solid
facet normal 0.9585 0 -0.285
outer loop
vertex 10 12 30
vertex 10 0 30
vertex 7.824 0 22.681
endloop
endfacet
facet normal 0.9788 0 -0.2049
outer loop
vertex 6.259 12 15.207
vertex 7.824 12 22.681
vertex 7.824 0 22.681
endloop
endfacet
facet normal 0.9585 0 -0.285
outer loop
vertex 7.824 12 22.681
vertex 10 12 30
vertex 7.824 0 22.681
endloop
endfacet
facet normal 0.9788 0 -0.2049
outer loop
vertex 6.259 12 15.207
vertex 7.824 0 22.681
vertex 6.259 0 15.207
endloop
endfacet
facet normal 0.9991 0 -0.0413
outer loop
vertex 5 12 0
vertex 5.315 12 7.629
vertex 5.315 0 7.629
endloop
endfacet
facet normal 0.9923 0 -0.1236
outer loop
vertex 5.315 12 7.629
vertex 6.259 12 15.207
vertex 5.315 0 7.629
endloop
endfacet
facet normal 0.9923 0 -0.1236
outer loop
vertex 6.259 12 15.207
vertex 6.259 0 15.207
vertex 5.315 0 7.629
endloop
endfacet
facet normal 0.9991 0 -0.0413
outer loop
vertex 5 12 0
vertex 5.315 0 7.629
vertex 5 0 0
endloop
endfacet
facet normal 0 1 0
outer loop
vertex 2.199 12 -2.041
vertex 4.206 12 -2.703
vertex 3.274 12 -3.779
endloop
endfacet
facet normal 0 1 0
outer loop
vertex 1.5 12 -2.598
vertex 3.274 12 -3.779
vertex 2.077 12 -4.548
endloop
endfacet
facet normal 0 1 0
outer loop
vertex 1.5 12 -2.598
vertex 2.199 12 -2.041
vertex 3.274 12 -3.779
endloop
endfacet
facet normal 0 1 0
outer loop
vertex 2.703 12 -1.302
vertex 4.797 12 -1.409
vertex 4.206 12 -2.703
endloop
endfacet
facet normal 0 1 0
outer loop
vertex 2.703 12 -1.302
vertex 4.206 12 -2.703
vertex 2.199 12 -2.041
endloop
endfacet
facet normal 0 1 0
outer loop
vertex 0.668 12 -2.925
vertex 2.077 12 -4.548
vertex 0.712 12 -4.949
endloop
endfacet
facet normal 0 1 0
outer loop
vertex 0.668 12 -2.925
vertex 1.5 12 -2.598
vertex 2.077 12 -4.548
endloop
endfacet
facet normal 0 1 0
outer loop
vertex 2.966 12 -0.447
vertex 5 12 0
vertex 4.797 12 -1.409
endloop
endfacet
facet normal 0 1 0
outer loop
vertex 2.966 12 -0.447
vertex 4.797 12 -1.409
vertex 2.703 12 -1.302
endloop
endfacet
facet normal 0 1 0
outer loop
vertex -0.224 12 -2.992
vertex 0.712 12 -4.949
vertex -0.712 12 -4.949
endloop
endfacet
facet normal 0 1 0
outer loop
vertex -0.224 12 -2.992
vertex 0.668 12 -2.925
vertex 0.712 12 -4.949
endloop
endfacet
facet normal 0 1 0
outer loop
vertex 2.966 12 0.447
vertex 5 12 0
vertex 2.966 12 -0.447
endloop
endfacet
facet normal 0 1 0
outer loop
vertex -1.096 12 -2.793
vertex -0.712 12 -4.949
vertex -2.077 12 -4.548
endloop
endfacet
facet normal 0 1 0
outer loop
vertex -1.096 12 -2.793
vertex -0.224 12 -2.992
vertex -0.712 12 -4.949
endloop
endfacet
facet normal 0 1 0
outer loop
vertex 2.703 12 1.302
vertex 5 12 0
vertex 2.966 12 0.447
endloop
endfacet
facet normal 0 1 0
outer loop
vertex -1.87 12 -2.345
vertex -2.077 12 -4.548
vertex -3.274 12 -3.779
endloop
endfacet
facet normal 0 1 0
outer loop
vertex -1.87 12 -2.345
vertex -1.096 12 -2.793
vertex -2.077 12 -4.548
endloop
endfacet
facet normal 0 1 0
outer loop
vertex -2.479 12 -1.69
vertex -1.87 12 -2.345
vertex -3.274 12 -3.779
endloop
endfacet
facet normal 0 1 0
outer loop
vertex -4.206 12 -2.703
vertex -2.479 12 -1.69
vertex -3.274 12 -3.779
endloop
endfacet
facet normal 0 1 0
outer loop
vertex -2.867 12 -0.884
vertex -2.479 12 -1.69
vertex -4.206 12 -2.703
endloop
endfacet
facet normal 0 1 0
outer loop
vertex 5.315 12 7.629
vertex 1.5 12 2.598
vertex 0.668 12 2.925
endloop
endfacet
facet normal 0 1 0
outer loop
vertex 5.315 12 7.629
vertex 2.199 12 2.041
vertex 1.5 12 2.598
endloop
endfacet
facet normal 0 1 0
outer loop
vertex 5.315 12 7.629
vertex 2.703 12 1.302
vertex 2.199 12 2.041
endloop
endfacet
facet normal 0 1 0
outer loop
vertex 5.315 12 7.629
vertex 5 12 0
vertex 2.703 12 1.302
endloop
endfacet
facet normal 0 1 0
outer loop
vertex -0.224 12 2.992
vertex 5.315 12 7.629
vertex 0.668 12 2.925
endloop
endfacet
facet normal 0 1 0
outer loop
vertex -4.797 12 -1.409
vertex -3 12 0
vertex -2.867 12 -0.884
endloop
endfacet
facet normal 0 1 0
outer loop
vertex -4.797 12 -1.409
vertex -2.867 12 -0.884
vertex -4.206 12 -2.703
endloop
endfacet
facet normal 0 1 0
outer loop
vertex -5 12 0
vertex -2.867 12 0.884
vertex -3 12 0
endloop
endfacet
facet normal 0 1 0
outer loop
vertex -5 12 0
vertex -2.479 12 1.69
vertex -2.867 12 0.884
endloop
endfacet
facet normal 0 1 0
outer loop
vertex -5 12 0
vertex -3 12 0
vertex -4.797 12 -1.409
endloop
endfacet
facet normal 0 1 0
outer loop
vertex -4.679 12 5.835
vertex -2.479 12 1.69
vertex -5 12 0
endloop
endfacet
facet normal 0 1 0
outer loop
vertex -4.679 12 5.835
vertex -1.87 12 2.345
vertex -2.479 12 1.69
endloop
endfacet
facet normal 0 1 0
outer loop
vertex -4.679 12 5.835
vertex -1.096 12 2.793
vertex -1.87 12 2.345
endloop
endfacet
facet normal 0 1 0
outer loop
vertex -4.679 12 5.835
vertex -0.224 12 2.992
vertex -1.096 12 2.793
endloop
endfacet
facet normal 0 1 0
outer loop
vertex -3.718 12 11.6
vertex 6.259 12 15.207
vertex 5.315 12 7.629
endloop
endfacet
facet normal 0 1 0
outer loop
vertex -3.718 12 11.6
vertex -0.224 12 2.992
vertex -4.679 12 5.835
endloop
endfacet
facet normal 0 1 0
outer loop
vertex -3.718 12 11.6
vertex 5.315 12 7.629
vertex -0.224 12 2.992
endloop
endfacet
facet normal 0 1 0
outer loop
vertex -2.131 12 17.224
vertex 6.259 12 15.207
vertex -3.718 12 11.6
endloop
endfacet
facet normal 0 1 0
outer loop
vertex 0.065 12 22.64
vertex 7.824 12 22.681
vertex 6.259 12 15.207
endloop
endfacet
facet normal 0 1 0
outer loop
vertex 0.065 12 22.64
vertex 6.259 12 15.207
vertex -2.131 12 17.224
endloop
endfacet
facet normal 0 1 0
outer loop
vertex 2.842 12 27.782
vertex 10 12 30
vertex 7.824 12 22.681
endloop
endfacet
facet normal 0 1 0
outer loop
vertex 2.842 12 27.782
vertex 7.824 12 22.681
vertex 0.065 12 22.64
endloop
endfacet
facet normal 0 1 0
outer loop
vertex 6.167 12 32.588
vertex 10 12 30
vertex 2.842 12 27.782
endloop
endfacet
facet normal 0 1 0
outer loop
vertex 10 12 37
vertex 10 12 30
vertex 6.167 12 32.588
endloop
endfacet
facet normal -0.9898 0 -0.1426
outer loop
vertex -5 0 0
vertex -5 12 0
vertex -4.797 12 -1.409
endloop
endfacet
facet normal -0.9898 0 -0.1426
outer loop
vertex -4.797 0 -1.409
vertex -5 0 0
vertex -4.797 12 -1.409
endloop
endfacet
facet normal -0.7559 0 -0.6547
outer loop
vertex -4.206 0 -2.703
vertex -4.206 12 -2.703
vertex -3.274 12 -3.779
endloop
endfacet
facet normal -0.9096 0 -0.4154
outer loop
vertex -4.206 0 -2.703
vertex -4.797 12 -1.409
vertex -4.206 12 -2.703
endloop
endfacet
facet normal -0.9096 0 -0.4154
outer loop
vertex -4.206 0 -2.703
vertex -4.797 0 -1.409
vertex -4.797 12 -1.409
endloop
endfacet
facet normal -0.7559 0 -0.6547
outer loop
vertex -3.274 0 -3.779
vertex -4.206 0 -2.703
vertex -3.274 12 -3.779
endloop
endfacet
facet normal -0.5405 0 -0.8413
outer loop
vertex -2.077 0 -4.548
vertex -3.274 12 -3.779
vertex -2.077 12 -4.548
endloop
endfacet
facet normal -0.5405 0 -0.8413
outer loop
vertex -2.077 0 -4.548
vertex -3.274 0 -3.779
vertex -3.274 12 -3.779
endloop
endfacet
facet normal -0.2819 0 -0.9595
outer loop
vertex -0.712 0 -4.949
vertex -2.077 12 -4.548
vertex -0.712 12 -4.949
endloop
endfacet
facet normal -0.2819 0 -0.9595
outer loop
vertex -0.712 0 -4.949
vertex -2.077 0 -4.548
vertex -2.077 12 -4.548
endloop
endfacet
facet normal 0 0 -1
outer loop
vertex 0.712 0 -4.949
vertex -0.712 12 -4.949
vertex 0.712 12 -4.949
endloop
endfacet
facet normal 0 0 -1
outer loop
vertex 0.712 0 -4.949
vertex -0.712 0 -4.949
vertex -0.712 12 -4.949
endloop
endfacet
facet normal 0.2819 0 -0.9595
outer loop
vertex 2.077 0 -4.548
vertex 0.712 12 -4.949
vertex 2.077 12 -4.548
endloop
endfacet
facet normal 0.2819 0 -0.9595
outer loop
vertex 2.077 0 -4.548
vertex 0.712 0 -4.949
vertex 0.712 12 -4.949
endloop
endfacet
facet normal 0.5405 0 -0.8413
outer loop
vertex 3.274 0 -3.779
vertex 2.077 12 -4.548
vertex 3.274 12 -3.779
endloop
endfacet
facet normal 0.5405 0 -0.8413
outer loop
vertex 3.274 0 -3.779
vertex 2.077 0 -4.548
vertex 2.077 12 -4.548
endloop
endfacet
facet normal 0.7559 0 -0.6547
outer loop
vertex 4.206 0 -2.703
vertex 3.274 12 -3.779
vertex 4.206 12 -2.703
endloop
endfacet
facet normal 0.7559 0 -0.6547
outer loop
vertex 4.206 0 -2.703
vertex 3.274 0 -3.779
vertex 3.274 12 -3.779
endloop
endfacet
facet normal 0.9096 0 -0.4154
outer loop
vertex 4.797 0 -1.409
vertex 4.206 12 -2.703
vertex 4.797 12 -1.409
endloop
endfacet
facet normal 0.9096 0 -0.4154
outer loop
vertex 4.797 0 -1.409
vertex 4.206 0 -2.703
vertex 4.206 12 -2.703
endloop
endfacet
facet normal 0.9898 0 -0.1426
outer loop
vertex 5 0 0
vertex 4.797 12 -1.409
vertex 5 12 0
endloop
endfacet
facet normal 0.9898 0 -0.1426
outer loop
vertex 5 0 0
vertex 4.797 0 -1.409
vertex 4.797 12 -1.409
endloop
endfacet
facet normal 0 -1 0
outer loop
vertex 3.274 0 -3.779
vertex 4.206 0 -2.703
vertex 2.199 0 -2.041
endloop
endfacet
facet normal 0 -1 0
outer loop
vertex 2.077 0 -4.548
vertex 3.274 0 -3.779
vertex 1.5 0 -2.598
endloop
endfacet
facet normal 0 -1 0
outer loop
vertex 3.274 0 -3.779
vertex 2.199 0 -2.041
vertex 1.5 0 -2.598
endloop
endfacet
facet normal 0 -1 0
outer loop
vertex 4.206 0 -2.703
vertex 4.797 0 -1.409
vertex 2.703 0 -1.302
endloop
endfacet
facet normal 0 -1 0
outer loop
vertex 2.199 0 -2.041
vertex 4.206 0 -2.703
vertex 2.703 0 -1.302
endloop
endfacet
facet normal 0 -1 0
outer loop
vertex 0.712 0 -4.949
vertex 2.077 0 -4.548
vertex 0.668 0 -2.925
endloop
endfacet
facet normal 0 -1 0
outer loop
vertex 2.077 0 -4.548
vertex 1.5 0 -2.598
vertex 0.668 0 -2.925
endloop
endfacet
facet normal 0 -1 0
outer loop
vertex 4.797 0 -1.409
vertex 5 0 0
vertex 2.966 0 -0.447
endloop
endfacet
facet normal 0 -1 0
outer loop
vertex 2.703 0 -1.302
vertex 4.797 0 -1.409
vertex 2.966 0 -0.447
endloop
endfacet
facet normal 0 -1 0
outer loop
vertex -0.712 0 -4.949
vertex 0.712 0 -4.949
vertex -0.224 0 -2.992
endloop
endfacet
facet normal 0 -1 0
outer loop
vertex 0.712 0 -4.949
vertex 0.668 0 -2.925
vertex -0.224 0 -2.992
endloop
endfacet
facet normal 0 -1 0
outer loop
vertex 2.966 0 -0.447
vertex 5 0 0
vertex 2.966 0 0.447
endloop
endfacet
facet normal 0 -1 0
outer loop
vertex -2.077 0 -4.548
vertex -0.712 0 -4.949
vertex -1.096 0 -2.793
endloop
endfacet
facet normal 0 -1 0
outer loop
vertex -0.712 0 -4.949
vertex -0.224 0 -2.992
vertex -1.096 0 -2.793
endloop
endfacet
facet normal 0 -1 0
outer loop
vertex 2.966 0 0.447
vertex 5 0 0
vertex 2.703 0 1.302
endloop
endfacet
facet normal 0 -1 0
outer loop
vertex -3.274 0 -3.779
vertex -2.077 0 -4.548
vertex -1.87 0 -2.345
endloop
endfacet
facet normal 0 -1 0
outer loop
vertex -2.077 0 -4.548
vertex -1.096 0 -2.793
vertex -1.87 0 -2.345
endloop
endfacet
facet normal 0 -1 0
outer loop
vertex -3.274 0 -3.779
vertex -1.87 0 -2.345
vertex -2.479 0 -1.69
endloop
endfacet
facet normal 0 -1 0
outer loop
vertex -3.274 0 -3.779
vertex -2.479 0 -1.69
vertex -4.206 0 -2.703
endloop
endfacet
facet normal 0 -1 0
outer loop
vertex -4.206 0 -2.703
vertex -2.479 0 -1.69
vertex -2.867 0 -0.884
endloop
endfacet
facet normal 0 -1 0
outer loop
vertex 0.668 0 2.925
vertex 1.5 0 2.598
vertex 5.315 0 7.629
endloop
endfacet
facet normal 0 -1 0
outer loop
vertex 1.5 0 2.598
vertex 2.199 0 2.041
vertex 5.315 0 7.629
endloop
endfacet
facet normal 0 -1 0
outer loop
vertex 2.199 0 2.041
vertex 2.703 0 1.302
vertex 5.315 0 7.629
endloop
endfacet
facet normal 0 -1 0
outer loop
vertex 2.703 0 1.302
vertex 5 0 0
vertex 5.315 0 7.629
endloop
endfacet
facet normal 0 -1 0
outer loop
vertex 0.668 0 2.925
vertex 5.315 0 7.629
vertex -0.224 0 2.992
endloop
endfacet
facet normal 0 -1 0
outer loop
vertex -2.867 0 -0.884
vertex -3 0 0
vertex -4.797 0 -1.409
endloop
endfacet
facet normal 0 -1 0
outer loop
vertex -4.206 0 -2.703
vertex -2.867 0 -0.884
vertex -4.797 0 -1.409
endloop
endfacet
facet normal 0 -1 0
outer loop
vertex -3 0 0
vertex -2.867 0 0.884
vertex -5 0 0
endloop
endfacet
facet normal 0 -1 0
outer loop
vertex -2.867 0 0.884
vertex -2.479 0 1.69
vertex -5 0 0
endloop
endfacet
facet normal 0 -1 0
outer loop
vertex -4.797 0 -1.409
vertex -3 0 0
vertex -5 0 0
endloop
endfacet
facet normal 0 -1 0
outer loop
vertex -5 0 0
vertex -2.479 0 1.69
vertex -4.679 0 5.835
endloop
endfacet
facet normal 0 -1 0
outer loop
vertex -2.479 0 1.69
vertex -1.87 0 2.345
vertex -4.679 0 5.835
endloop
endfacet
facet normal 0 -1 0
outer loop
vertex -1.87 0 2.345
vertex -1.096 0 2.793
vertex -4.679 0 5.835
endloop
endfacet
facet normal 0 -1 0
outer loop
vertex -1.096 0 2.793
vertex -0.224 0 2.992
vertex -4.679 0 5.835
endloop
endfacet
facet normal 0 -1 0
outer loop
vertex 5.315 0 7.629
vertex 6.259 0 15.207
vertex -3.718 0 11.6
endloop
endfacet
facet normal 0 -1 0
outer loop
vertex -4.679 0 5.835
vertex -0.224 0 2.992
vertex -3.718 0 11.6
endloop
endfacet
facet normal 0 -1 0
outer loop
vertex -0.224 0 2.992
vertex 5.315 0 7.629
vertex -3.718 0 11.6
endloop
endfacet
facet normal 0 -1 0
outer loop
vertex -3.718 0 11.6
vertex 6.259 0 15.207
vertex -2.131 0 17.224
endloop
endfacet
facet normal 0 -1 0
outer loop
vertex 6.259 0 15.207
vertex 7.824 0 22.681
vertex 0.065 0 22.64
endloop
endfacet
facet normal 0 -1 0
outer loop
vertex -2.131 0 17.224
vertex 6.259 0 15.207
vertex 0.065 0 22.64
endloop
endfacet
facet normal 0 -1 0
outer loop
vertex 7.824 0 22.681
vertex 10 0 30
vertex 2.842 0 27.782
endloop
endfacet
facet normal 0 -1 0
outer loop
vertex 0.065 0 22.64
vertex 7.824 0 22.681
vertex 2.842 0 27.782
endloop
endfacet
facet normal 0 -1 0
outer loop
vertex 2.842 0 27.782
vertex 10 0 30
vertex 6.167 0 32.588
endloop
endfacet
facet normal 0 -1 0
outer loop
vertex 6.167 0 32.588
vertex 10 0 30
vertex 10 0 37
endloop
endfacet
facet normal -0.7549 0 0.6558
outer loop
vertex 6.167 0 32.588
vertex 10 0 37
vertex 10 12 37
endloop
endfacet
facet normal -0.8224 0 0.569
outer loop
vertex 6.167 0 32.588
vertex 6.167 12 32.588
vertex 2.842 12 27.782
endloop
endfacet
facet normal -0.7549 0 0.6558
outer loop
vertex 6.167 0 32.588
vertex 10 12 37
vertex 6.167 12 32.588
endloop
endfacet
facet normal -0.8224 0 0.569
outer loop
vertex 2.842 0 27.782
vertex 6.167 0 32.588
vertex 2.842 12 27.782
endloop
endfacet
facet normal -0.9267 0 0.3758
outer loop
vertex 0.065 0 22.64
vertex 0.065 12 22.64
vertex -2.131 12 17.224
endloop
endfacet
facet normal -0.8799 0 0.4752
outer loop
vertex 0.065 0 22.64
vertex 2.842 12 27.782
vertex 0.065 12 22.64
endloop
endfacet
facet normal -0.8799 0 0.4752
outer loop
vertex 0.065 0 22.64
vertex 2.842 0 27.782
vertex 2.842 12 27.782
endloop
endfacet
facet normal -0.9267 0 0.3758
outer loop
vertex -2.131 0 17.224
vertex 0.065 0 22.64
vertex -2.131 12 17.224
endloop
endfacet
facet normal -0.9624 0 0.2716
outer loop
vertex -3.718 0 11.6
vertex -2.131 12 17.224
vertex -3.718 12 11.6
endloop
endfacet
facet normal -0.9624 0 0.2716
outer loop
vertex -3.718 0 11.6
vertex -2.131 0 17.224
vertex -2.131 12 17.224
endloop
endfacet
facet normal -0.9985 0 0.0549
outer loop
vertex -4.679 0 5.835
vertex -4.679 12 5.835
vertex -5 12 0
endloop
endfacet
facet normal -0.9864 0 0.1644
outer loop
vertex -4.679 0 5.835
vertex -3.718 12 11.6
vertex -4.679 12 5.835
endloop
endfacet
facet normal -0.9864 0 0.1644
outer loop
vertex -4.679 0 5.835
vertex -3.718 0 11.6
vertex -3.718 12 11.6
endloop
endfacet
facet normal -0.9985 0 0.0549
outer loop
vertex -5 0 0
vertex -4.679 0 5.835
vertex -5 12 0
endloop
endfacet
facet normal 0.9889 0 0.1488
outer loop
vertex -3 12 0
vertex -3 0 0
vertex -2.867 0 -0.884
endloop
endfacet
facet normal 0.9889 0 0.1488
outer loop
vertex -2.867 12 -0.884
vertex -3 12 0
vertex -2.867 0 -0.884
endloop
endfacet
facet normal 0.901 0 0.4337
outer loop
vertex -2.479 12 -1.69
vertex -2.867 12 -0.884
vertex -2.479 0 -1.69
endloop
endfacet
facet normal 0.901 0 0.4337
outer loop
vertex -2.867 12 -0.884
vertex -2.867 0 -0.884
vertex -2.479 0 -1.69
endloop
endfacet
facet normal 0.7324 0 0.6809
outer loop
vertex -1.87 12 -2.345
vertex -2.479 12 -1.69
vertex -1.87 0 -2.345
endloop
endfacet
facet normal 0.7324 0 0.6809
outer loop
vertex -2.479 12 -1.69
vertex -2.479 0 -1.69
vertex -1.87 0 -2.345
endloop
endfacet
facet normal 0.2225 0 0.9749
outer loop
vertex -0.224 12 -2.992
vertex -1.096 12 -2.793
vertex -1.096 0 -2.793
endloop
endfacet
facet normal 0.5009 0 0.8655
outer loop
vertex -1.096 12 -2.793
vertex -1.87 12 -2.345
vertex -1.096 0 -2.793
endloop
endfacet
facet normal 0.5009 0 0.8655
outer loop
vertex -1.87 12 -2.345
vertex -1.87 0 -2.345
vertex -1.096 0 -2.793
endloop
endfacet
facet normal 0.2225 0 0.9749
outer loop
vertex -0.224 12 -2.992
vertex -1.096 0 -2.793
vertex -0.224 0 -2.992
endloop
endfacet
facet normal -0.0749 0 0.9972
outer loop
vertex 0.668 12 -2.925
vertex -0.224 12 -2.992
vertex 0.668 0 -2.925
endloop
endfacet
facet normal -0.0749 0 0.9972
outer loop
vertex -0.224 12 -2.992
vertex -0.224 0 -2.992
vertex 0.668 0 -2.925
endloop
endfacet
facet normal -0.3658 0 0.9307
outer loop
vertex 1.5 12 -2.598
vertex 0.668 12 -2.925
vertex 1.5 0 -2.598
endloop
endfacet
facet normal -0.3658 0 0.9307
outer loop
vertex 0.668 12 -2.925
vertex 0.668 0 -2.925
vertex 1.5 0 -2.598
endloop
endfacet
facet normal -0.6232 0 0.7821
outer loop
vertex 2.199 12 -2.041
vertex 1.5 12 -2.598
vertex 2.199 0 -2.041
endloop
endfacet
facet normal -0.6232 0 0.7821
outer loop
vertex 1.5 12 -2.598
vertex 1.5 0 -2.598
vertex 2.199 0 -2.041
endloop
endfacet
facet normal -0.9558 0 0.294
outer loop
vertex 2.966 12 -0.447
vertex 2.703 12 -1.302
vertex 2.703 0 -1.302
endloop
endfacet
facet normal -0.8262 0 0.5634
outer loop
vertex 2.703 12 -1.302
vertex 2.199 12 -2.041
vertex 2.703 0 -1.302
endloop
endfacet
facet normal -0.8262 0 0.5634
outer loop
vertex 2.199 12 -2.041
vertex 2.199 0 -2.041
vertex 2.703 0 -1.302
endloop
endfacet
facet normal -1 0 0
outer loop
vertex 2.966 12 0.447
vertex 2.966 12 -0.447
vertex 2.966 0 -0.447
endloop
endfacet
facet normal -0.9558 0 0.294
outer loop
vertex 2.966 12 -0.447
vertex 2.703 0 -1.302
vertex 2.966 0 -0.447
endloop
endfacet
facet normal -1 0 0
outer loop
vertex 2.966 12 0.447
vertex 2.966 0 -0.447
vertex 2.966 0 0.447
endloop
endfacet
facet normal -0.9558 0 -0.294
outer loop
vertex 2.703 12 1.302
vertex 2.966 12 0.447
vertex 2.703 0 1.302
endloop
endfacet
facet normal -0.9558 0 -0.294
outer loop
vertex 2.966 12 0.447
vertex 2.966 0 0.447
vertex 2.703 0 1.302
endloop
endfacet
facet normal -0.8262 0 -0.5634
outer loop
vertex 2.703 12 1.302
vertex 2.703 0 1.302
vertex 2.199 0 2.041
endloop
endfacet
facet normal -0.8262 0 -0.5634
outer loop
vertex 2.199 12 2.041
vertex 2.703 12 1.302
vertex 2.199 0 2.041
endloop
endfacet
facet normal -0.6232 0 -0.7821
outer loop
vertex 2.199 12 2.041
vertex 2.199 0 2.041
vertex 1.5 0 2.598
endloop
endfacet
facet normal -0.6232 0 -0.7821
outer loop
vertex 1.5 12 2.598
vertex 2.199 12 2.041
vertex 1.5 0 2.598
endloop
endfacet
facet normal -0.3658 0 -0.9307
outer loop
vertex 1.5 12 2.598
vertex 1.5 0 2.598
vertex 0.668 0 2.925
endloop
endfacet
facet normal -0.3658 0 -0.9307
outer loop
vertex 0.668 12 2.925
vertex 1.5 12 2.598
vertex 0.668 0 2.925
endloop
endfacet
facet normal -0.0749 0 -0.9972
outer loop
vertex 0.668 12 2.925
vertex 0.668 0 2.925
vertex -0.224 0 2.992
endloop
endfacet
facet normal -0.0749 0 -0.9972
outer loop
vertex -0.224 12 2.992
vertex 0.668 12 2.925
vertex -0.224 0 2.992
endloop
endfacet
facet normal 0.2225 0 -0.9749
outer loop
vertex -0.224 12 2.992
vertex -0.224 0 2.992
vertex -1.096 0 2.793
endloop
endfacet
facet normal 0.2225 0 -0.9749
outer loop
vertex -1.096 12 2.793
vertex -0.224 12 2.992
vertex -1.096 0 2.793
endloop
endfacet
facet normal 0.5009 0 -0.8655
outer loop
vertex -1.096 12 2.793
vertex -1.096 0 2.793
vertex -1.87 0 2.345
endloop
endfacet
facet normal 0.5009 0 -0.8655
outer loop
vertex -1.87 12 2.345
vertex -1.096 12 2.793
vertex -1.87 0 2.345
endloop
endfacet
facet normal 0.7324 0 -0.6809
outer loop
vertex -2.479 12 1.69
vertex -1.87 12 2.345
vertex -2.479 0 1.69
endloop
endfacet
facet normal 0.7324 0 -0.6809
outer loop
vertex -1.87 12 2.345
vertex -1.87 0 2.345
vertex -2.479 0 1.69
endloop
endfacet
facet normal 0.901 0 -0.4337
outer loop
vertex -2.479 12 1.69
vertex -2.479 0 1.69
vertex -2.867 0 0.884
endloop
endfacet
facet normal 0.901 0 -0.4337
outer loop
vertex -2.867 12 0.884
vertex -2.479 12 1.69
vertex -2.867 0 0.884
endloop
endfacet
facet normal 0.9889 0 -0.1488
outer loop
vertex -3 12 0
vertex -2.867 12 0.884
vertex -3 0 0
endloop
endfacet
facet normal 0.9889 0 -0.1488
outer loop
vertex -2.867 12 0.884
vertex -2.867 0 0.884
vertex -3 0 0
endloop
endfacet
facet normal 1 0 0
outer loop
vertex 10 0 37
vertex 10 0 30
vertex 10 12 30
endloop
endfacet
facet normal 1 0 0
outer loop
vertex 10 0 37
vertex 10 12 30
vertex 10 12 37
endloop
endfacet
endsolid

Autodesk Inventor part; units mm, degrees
ref_plane "YZ Plane" through (0, 0, 0) normal (1, 0, 0) x (0, 1, 0)
ref_plane "XZ Plane" through (0, 0, 0) normal (0, 1, 0) x (-1, 0, 0)
ref_plane "XY Plane" through (0, 0, 0) normal (0, 0, 1) x (1, 0, 0)
sketch "Sketch1" plane through (0, 0, 0) normal (0, 1, 0) x (-1, 0, 0)
  circle A0 centre (0, 0) radius 3
  arc A1 (-5, 0) -> (5, 0) centre (0, 0) ccw
  line L0 (-10.0001, 41) -> (-10, 19) construction
  line L1 (0, 0) -> (-5, 0) construction
  line L2 (-10.0001, 30) -> (-10.0001, 37)
  arc A2 (5, 0) -> (-10.0001, 37) centre (-48.1331, 0) ccw
  arc A3 (-5, 0) -> (-10.0001, 30) centre (-97.4989, 0) ccw
  line L3 (0, 0) -> (5, 0)
  arc A4 (5, 0) -> (-5, 0) centre (0, 0) ccw construction
  dimension "d0" = 6
  dimension "d1" = 2
  dimension "d2" = 10
  dimension "d3" = 30
  dimension "d4" = 5.0001
  dimension "d5" = 7
extrude "Extrusion1" add sketch "Sketch1" along normal blind 12
properties part number "Clutch"
